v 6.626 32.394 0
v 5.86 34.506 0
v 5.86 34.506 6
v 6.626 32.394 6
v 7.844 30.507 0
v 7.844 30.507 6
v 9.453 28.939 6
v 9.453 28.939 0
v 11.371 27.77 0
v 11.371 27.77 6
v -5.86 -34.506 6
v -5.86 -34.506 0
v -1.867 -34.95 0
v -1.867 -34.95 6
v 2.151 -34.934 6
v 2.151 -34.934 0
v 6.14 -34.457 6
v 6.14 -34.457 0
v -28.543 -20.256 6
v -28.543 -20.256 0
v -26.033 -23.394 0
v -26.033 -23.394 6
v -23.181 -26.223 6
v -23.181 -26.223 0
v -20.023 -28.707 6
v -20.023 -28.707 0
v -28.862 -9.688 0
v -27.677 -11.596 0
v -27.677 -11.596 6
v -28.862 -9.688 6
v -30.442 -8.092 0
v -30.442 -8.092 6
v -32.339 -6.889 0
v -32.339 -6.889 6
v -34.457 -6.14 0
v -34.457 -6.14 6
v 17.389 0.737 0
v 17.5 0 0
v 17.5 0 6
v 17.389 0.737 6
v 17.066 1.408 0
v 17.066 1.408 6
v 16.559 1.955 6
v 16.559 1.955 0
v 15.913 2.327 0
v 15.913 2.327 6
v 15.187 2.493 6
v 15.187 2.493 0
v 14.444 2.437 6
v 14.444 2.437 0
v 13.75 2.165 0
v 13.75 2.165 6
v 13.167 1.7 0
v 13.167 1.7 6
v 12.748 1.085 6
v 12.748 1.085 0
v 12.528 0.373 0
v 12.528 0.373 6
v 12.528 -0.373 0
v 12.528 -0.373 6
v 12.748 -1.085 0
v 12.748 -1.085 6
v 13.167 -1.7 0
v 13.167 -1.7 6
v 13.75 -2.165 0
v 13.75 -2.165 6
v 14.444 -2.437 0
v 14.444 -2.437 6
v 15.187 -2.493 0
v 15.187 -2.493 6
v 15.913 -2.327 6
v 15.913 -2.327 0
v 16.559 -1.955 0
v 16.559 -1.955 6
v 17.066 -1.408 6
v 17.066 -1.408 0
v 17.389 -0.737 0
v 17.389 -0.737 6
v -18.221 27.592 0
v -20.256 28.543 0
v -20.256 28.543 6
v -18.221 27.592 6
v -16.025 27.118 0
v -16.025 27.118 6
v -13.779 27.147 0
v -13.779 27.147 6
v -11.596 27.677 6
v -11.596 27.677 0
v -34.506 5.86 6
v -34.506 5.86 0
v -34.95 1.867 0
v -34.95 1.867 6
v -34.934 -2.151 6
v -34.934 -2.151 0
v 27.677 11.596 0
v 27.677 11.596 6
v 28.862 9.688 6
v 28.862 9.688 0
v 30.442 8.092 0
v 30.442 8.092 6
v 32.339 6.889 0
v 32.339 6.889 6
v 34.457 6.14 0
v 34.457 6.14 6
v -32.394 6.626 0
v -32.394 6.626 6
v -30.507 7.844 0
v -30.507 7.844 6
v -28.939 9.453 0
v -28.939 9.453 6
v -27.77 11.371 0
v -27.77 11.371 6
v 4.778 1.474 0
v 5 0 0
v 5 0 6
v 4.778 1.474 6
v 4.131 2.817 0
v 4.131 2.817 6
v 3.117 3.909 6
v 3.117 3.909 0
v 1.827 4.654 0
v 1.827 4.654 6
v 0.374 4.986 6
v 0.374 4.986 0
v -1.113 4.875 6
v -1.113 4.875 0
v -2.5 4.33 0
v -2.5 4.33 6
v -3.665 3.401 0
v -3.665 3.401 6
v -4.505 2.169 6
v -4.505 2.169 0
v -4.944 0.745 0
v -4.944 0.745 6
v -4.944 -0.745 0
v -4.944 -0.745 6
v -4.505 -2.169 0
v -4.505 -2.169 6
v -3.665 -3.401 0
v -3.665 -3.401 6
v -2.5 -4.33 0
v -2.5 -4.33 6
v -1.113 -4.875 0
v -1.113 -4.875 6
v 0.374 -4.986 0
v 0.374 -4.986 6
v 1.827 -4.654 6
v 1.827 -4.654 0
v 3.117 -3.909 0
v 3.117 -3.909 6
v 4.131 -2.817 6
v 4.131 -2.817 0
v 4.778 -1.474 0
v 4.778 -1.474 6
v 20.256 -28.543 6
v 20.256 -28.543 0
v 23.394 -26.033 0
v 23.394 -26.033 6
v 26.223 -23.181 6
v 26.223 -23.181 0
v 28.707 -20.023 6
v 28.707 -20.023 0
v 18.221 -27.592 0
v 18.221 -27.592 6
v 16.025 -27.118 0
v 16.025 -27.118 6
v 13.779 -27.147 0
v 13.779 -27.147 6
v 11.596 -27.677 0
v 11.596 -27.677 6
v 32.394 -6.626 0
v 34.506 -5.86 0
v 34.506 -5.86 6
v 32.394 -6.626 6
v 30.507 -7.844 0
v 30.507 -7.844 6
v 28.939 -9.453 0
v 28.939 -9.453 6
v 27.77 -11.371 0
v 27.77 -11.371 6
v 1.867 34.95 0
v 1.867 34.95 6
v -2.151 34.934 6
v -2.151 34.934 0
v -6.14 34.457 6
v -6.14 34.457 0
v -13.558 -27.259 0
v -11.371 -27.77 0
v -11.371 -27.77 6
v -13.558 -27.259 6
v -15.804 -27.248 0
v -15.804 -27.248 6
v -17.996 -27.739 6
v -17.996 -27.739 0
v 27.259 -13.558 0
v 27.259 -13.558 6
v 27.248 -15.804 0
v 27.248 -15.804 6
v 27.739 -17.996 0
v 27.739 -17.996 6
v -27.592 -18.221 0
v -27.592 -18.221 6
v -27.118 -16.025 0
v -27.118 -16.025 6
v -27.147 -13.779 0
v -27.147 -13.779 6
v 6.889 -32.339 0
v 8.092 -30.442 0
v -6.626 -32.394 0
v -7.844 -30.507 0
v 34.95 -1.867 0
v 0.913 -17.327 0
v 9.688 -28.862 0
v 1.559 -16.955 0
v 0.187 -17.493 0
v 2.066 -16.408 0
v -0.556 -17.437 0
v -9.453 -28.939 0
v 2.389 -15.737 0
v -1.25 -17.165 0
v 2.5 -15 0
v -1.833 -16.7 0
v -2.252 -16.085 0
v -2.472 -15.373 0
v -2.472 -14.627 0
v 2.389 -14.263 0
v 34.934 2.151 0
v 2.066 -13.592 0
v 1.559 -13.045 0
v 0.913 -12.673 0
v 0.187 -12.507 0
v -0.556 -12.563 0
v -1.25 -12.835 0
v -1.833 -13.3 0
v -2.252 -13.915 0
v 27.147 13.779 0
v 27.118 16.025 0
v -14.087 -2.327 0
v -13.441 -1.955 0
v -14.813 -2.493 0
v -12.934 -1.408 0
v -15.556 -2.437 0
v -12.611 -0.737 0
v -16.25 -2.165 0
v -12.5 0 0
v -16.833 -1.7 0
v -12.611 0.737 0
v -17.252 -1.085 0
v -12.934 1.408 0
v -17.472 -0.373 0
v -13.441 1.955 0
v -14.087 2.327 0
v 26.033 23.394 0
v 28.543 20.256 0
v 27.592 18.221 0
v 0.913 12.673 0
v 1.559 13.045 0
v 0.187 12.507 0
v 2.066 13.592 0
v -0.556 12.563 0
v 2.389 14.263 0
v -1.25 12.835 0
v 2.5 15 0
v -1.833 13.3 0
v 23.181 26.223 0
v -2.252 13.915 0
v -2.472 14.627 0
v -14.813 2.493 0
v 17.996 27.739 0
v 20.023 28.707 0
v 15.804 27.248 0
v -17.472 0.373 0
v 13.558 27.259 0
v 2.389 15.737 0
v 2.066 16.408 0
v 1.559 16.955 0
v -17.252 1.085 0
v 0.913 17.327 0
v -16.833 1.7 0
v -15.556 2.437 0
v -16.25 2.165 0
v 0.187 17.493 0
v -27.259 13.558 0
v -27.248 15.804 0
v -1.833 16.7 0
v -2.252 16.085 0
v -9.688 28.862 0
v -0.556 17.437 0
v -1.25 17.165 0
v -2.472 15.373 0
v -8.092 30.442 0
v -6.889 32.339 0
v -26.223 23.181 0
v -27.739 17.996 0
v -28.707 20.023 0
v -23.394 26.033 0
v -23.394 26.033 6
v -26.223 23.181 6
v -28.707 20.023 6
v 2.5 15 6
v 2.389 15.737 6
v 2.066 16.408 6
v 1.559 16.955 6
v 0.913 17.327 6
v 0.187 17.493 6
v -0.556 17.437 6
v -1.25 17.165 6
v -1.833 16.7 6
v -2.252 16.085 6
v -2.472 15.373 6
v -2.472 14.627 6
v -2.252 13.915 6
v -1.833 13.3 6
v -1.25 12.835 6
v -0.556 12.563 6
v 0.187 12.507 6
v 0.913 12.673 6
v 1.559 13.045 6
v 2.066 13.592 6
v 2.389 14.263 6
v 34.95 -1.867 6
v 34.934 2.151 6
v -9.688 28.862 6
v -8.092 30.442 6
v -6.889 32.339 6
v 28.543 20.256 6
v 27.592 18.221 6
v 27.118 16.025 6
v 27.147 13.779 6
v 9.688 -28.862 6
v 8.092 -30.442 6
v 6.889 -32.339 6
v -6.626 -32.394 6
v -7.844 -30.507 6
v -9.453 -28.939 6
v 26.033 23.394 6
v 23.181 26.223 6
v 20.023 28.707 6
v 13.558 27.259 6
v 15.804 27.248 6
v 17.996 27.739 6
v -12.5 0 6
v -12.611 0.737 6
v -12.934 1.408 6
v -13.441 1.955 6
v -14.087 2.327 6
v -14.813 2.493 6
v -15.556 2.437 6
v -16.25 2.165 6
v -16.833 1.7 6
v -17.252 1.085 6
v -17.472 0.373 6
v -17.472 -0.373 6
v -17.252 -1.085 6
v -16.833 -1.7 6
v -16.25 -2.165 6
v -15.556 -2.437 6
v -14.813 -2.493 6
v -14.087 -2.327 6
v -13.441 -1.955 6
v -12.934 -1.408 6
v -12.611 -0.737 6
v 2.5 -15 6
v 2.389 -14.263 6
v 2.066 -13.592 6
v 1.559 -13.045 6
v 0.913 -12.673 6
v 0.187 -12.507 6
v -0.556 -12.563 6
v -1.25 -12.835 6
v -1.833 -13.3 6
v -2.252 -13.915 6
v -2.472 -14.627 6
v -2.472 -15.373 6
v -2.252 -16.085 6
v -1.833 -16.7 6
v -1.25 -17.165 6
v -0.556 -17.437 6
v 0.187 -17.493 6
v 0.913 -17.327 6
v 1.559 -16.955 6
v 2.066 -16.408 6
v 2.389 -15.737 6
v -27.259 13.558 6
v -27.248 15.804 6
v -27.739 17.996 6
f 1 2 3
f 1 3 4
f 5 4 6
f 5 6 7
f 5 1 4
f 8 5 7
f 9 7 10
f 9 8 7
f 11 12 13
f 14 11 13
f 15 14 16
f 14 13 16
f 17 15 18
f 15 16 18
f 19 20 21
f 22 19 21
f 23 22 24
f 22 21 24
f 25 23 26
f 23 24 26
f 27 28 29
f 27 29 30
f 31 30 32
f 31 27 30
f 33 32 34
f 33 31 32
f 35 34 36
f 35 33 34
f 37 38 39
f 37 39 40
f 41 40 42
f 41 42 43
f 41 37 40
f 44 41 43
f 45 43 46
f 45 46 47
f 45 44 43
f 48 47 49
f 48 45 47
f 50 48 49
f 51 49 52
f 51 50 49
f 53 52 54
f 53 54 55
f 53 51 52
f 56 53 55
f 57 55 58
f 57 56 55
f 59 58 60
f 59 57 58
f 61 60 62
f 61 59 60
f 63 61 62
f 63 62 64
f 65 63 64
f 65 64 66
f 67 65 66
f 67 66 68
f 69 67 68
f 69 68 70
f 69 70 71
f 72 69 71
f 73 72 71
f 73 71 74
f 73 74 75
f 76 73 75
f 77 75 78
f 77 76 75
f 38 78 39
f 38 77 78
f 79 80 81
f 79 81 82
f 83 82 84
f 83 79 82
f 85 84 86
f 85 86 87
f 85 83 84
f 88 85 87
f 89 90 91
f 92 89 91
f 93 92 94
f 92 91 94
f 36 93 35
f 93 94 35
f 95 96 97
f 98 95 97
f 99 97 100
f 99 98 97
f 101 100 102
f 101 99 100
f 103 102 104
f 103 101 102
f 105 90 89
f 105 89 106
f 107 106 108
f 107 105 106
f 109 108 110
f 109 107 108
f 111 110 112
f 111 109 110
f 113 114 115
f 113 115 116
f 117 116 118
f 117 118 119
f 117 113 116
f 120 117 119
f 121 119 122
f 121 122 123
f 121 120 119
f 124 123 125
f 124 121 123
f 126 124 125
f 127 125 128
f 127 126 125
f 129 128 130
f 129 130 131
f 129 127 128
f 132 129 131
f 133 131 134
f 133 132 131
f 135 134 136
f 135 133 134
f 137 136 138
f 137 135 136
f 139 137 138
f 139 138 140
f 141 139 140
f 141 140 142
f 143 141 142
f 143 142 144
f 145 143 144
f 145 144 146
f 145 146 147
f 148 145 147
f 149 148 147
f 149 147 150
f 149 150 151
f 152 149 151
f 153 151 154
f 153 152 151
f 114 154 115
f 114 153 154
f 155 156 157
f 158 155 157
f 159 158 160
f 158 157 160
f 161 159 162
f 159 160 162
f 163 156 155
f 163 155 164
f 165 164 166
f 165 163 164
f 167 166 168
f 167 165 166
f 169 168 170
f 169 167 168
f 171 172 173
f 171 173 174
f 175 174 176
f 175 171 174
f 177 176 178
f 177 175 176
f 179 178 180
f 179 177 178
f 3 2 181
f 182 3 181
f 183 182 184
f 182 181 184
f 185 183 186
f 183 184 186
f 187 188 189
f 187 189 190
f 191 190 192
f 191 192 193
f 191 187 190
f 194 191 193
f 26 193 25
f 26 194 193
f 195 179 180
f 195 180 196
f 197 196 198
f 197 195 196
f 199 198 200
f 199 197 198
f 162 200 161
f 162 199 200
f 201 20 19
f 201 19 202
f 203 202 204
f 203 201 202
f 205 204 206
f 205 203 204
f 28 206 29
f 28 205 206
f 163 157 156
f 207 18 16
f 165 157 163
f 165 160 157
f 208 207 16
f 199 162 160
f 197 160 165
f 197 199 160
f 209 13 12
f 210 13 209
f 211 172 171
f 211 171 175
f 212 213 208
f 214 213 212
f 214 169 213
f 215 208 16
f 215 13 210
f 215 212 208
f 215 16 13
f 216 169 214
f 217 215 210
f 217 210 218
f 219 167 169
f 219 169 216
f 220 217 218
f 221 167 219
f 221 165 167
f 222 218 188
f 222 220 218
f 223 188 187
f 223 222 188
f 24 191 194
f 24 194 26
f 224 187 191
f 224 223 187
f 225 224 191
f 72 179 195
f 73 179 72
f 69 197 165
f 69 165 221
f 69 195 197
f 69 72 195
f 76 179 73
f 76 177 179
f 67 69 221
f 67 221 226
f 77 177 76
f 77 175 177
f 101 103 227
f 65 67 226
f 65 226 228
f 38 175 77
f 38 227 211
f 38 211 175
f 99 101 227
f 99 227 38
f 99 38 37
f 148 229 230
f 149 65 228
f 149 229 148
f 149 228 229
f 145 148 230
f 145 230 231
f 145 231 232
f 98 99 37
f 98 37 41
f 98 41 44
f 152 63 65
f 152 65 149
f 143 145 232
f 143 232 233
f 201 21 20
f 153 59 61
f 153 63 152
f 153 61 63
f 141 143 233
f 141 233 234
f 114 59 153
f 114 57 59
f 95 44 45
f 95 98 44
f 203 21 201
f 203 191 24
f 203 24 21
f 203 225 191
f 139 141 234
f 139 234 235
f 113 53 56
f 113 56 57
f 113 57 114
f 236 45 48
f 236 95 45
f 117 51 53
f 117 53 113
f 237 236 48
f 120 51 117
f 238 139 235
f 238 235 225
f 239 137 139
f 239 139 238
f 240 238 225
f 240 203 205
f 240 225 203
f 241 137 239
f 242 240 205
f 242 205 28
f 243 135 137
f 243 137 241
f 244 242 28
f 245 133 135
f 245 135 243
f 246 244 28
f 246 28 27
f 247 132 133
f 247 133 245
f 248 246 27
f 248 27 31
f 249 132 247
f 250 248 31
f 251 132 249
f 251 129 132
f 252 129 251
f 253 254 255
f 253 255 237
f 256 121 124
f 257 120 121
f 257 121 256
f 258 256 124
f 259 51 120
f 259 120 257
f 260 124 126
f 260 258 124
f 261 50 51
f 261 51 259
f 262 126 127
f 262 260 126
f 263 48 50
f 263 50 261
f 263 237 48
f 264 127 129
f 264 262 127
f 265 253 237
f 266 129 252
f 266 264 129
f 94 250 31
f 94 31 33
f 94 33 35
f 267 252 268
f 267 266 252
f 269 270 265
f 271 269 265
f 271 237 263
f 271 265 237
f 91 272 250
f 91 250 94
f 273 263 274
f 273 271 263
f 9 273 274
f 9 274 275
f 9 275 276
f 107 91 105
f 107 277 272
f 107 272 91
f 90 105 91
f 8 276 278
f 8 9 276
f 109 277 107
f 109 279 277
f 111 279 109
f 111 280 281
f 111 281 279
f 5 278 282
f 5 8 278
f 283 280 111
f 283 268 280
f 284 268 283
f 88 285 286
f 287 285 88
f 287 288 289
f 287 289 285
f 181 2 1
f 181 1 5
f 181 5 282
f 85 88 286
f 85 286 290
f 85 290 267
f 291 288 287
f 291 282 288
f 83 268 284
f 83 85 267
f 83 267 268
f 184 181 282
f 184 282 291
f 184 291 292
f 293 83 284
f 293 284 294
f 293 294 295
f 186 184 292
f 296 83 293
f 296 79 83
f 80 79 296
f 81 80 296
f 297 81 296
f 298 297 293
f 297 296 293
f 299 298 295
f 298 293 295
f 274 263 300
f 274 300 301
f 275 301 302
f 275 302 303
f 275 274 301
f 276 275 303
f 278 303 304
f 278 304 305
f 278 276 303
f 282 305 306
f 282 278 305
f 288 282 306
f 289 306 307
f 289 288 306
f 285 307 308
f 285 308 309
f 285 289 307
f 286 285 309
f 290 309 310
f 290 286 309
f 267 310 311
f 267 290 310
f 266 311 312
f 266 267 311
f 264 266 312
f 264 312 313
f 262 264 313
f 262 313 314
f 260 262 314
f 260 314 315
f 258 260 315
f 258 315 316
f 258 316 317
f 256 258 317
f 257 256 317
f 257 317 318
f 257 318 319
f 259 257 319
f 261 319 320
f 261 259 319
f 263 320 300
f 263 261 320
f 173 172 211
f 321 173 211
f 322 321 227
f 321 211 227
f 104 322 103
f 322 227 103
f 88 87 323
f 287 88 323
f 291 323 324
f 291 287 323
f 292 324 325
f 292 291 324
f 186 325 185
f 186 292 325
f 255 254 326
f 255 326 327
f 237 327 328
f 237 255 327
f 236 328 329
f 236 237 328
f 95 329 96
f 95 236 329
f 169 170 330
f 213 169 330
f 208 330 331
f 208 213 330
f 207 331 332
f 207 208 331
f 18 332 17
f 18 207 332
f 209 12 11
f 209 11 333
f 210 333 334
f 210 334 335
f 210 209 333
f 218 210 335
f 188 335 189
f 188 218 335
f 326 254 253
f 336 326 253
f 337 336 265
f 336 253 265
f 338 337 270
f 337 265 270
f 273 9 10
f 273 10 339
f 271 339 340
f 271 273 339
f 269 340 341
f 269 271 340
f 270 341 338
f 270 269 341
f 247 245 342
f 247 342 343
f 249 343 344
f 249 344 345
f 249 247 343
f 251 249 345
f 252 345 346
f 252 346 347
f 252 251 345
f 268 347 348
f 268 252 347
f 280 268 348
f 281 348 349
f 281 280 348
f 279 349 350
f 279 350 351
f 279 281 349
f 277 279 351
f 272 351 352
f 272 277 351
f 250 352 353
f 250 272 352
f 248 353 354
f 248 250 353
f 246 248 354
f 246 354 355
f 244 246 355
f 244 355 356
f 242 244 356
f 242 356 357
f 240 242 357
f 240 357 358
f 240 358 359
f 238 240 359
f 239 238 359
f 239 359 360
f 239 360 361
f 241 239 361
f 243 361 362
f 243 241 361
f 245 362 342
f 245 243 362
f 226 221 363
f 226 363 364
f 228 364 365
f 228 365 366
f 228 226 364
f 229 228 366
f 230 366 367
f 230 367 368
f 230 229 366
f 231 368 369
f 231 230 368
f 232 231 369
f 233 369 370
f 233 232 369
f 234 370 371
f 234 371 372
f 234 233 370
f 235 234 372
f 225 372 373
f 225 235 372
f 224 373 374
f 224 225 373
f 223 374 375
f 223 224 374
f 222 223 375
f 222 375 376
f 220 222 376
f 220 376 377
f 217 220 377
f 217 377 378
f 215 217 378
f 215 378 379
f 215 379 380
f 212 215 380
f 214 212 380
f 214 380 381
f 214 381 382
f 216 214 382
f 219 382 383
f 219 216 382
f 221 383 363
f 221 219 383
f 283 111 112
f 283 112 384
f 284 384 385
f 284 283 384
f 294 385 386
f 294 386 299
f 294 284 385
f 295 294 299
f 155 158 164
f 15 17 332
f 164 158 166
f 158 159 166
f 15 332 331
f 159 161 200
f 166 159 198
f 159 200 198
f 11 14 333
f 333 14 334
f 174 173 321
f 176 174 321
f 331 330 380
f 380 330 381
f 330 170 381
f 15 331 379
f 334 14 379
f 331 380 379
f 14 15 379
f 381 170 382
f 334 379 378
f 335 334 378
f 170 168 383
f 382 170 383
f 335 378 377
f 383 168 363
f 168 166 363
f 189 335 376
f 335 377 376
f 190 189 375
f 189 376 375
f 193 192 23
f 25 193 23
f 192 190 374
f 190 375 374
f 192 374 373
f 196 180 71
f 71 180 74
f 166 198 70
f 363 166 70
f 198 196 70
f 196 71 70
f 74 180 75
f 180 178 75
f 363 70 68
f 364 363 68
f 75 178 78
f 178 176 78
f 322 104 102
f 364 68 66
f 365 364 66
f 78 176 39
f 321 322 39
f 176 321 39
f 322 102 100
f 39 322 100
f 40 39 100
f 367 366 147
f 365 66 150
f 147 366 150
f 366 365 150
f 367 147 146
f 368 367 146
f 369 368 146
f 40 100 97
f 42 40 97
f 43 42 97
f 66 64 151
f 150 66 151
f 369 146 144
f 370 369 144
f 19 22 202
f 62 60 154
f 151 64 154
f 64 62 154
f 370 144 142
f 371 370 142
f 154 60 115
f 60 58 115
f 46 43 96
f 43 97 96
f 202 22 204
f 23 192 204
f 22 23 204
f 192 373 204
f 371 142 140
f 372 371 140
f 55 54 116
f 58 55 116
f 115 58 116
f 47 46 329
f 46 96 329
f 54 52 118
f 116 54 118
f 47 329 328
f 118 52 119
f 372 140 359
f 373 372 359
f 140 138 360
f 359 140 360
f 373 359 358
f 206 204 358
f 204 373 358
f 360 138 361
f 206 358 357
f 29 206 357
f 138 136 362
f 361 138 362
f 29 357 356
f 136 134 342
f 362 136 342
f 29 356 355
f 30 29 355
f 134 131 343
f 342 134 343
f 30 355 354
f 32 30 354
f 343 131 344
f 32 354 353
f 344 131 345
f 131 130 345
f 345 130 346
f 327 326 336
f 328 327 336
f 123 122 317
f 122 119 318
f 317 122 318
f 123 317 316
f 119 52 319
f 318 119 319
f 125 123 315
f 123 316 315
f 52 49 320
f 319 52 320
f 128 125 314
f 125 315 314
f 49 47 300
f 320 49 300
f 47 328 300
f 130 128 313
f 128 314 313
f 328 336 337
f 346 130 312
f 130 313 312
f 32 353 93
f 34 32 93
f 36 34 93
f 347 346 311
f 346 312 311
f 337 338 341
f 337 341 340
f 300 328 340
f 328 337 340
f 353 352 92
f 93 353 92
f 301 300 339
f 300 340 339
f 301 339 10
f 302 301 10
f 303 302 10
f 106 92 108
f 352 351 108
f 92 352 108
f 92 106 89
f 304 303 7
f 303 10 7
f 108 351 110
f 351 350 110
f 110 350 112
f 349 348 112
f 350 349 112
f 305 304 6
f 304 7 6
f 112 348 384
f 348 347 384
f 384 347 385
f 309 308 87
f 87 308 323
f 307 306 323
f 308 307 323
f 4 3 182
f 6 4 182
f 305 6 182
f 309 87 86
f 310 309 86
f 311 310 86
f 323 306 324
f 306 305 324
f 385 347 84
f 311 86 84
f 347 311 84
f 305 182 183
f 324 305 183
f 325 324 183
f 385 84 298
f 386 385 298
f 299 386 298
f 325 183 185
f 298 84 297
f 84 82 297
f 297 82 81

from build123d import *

# Parameters (mm, degrees)
SKETCH1_R           = 2.5
SKETCH1_R_2         = 5
BOSS_EXTRUDE1_DEPTH = 6
FILLET1_R           = 10


with BuildPart() as part:
    # Sketch1 → Boss-Extrude1 (new body)
    with BuildSketch(Plane.XY):
        with BuildLine():
            Line((-6.140421203, 34.4571506), (-7.075568353, 29.153667565))
            ThreePointArc((-7.075568353, 29.153667565), (-11.615235602, 27.660193454), (-15.860146326, 25.464794492))
            Line((-15.860146326, 25.464794492), (-20.256034573, 28.54282858))
            ThreePointArc((-20.256034573, 28.54282858), (-24.849292098, 24.647772358), (-28.706818321, 20.022951378))
            Line((-28.706818321, 20.022951378), (-25.617938395, 15.611573668))
            ThreePointArc((-25.617938395, 15.611573668), (-27.77192222, 11.345498501), (-29.221145884, 6.791511849))
            Line((-29.221145884, 6.791511849), (-34.50600705, 5.859648236))
            ThreePointArc((-34.50600705, 5.859648236), (-34.999709926, -0.142495975), (-34.4571506, -6.140421203))
            Line((-34.4571506, -6.140421203), (-29.153667565, -7.075568353))
            ThreePointArc((-29.153667565, -7.075568353), (-27.660193454, -11.615235602), (-25.464794492, -15.860146326))
            Line((-25.464794492, -15.860146326), (-28.54282858, -20.256034573))
            ThreePointArc((-28.54282858, -20.256034573), (-24.647772358, -24.849292098), (-20.022951378, -28.706818321))
            Line((-20.022951378, -28.706818321), (-15.611573668, -25.617938395))
            ThreePointArc((-15.611573668, -25.617938395), (-11.345498501, -27.77192222), (-6.791511849, -29.221145884))
            Line((-6.791511849, -29.221145884), (-5.859648236, -34.50600705))
            ThreePointArc((-5.859648236, -34.50600705), (0.142495975, -34.999709926), (6.140421203, -34.4571506))
            Line((6.140421203, -34.4571506), (7.075568353, -29.153667565))
            ThreePointArc((7.075568353, -29.153667565), (11.615235602, -27.660193454), (15.860146326, -25.464794492))
            Line((15.860146326, -25.464794492), (20.256034573, -28.54282858))
            ThreePointArc((20.256034573, -28.54282858), (24.849292098, -24.647772358), (28.706818321, -20.022951378))
            Line((28.706818321, -20.022951378), (25.617938395, -15.611573668))
            ThreePointArc((25.617938395, -15.611573668), (27.77192222, -11.345498501), (29.221145884, -6.791511849))
            Line((29.221145884, -6.791511849), (34.50600705, -5.859648236))
            ThreePointArc((34.50600705, -5.859648236), (34.999709926, 0.142495975), (34.4571506, 6.140421203))
            Line((34.4571506, 6.140421203), (29.153667565, 7.075568353))
            ThreePointArc((29.153667565, 7.075568353), (27.660193454, 11.615235602), (25.464794492, 15.860146326))
            Line((25.464794492, 15.860146326), (28.54282858, 20.256034573))
            ThreePointArc((28.54282858, 20.256034573), (24.647772358, 24.849292098), (20.022951378, 28.706818321))
            Line((20.022951378, 28.706818321), (15.611573668, 25.617938395))
            ThreePointArc((15.611573668, 25.617938395), (11.345498501, 27.77192222), (6.791511849, 29.221145884))
            Line((6.791511849, 29.221145884), (5.859648236, 34.50600705))
            ThreePointArc((5.859648236, 34.50600705), (-0.142495975, 34.999709926), (-6.140421203, 34.4571506))
        make_face()
        with Locations((0, 15)):
            Circle(SKETCH1_R, mode=Mode.SUBTRACT)
        with Locations((15, 0)):
            Circle(SKETCH1_R, mode=Mode.SUBTRACT)
        with Locations((0, -15)):
            Circle(SKETCH1_R, mode=Mode.SUBTRACT)
        with Locations((-15, 0)):
            Circle(SKETCH1_R, mode=Mode.SUBTRACT)
        Circle(SKETCH1_R_2, mode=Mode.SUBTRACT)
    extrude(amount=BOSS_EXTRUDE1_DEPTH)

    # Fillet1
    # the kernel refuses this fillet: 10 mm, written as the material it adds along each edge
    with BuildSketch(Plane(origin=(6.791511849, 29.221145884, 0), x_dir=(0.9510209214740128, -0.3091265225093435, 0), z_dir=(0, 0, 1)), Plane(origin=(25.464794492, 15.860146326, 0), x_dir=(0.45388788231358146, -0.891058802935526, 0), z_dir=(0, 0, 1)), Plane(origin=(29.221145884, -6.791511849, 0), x_dir=(-0.3091265225093466, -0.9510209214740117, 0), z_dir=(0, 0, 1)), Plane(origin=(15.860146326, -25.464794492, 0), x_dir=(-0.8910588029355269, -0.45388788231357946, 0), z_dir=(0, 0, 1)), Plane(origin=(-6.791511849, -29.221145884, 0), x_dir=(-0.9510209214740112, 0.30912652250934813, 0), z_dir=(0, 0, 1)), Plane(origin=(-25.464794492, -15.860146326, 0), x_dir=(-0.4538878823135736, 0.8910588029355299, 0), z_dir=(0, 0, 1)), Plane(origin=(-29.221145884, 6.791511849, 0), x_dir=(0.30912652250934974, 0.9510209214740107, 0), z_dir=(0, 0, 1)), Plane(origin=(-15.860146326, 25.464794492, 0), x_dir=(0.8910588029355312, 0.45388788231357124, 0), z_dir=(0, 0, 1))) as fillet1_piece_1:
        with BuildLine():
            CenterArc((6.006376492, 9.963119175), FILLET1_R, 211.501234777, 53.576426358)
            Line((-2.519912546, 4.737949778), (-2.690438327, 4.63344639))
            ThreePointArc((-2.690438327, 4.63344639), (-1.436534977, 2.27506024), (-0.176578704, -0.093914649))
            Line((-0.176578704, -0.093914649), (0.017161076, -0.199262384))
            ThreePointArc((0.017161076, -0.199262384), (2.574161354, -0.089357526), (5.131161632, -0.199262384))
            Line((5.131161632, -0.199262384), (5.148322708, 0))
        make_face()
    extrude(amount=6)
    with BuildSketch(Plane(origin=(15.611573668, 25.617938395, 0), x_dir=(0.8191520442889787, 0.5735764363510647, 0), z_dir=(0, 0, 1)), Plane(origin=(29.153667565, 7.075568353, 0), x_dir=(0.9848077530122112, -0.17364817766691212, 0), z_dir=(0, 0, 1)), Plane(origin=(25.617938395, -15.611573668, 0), x_dir=(0.5735764363510597, -0.8191520442889821, 0), z_dir=(0, 0, 1)), Plane(origin=(7.075568353, -29.153667565, 0), x_dir=(-0.1736481776669137, -0.9848077530122109, 0), z_dir=(0, 0, 1)), Plane(origin=(-15.611573668, -25.617938395, 0), x_dir=(-0.8191520442889838, -0.5735764363510576, 0), z_dir=(0, 0, 1)), Plane(origin=(-29.153667565, -7.075568353, 0), x_dir=(-0.9848077530122104, 0.17364817766691737, 0), z_dir=(0, 0, 1)), Plane(origin=(-25.617938395, 15.611573668, 0), x_dir=(-0.5735764363510546, 0.8191520442889858, 0), z_dir=(0, 0, 1)), Plane(origin=(-7.075568353, 29.153667565, 0), x_dir=(0.17364817766690768, 0.984807753012212, 0), z_dir=(0, 0, 1))) as fillet1_piece_2:
        with BuildLine():
            CenterArc((5.913554395, 9.986037501), FILLET1_R, 213.395476897, 53.576426358)
            Line((-2.435358777, 4.481889172), (-2.602337041, 4.371806205))
            ThreePointArc((-2.602337041, 4.371806205), (-1.297983622, 2.197309054), (-0.183213989, -0.080203705))
            Line((-0.183213989, -0.080203705), (0, -0.2))
            ThreePointArc((0, -0.2), (2.692648905, -0.2), (5.374732678, -0.19972075))
            Line((5.374732678, -0.19972075), (5.385297809, 0))
        make_face()
    extrude(amount=6)


solid = part.part
